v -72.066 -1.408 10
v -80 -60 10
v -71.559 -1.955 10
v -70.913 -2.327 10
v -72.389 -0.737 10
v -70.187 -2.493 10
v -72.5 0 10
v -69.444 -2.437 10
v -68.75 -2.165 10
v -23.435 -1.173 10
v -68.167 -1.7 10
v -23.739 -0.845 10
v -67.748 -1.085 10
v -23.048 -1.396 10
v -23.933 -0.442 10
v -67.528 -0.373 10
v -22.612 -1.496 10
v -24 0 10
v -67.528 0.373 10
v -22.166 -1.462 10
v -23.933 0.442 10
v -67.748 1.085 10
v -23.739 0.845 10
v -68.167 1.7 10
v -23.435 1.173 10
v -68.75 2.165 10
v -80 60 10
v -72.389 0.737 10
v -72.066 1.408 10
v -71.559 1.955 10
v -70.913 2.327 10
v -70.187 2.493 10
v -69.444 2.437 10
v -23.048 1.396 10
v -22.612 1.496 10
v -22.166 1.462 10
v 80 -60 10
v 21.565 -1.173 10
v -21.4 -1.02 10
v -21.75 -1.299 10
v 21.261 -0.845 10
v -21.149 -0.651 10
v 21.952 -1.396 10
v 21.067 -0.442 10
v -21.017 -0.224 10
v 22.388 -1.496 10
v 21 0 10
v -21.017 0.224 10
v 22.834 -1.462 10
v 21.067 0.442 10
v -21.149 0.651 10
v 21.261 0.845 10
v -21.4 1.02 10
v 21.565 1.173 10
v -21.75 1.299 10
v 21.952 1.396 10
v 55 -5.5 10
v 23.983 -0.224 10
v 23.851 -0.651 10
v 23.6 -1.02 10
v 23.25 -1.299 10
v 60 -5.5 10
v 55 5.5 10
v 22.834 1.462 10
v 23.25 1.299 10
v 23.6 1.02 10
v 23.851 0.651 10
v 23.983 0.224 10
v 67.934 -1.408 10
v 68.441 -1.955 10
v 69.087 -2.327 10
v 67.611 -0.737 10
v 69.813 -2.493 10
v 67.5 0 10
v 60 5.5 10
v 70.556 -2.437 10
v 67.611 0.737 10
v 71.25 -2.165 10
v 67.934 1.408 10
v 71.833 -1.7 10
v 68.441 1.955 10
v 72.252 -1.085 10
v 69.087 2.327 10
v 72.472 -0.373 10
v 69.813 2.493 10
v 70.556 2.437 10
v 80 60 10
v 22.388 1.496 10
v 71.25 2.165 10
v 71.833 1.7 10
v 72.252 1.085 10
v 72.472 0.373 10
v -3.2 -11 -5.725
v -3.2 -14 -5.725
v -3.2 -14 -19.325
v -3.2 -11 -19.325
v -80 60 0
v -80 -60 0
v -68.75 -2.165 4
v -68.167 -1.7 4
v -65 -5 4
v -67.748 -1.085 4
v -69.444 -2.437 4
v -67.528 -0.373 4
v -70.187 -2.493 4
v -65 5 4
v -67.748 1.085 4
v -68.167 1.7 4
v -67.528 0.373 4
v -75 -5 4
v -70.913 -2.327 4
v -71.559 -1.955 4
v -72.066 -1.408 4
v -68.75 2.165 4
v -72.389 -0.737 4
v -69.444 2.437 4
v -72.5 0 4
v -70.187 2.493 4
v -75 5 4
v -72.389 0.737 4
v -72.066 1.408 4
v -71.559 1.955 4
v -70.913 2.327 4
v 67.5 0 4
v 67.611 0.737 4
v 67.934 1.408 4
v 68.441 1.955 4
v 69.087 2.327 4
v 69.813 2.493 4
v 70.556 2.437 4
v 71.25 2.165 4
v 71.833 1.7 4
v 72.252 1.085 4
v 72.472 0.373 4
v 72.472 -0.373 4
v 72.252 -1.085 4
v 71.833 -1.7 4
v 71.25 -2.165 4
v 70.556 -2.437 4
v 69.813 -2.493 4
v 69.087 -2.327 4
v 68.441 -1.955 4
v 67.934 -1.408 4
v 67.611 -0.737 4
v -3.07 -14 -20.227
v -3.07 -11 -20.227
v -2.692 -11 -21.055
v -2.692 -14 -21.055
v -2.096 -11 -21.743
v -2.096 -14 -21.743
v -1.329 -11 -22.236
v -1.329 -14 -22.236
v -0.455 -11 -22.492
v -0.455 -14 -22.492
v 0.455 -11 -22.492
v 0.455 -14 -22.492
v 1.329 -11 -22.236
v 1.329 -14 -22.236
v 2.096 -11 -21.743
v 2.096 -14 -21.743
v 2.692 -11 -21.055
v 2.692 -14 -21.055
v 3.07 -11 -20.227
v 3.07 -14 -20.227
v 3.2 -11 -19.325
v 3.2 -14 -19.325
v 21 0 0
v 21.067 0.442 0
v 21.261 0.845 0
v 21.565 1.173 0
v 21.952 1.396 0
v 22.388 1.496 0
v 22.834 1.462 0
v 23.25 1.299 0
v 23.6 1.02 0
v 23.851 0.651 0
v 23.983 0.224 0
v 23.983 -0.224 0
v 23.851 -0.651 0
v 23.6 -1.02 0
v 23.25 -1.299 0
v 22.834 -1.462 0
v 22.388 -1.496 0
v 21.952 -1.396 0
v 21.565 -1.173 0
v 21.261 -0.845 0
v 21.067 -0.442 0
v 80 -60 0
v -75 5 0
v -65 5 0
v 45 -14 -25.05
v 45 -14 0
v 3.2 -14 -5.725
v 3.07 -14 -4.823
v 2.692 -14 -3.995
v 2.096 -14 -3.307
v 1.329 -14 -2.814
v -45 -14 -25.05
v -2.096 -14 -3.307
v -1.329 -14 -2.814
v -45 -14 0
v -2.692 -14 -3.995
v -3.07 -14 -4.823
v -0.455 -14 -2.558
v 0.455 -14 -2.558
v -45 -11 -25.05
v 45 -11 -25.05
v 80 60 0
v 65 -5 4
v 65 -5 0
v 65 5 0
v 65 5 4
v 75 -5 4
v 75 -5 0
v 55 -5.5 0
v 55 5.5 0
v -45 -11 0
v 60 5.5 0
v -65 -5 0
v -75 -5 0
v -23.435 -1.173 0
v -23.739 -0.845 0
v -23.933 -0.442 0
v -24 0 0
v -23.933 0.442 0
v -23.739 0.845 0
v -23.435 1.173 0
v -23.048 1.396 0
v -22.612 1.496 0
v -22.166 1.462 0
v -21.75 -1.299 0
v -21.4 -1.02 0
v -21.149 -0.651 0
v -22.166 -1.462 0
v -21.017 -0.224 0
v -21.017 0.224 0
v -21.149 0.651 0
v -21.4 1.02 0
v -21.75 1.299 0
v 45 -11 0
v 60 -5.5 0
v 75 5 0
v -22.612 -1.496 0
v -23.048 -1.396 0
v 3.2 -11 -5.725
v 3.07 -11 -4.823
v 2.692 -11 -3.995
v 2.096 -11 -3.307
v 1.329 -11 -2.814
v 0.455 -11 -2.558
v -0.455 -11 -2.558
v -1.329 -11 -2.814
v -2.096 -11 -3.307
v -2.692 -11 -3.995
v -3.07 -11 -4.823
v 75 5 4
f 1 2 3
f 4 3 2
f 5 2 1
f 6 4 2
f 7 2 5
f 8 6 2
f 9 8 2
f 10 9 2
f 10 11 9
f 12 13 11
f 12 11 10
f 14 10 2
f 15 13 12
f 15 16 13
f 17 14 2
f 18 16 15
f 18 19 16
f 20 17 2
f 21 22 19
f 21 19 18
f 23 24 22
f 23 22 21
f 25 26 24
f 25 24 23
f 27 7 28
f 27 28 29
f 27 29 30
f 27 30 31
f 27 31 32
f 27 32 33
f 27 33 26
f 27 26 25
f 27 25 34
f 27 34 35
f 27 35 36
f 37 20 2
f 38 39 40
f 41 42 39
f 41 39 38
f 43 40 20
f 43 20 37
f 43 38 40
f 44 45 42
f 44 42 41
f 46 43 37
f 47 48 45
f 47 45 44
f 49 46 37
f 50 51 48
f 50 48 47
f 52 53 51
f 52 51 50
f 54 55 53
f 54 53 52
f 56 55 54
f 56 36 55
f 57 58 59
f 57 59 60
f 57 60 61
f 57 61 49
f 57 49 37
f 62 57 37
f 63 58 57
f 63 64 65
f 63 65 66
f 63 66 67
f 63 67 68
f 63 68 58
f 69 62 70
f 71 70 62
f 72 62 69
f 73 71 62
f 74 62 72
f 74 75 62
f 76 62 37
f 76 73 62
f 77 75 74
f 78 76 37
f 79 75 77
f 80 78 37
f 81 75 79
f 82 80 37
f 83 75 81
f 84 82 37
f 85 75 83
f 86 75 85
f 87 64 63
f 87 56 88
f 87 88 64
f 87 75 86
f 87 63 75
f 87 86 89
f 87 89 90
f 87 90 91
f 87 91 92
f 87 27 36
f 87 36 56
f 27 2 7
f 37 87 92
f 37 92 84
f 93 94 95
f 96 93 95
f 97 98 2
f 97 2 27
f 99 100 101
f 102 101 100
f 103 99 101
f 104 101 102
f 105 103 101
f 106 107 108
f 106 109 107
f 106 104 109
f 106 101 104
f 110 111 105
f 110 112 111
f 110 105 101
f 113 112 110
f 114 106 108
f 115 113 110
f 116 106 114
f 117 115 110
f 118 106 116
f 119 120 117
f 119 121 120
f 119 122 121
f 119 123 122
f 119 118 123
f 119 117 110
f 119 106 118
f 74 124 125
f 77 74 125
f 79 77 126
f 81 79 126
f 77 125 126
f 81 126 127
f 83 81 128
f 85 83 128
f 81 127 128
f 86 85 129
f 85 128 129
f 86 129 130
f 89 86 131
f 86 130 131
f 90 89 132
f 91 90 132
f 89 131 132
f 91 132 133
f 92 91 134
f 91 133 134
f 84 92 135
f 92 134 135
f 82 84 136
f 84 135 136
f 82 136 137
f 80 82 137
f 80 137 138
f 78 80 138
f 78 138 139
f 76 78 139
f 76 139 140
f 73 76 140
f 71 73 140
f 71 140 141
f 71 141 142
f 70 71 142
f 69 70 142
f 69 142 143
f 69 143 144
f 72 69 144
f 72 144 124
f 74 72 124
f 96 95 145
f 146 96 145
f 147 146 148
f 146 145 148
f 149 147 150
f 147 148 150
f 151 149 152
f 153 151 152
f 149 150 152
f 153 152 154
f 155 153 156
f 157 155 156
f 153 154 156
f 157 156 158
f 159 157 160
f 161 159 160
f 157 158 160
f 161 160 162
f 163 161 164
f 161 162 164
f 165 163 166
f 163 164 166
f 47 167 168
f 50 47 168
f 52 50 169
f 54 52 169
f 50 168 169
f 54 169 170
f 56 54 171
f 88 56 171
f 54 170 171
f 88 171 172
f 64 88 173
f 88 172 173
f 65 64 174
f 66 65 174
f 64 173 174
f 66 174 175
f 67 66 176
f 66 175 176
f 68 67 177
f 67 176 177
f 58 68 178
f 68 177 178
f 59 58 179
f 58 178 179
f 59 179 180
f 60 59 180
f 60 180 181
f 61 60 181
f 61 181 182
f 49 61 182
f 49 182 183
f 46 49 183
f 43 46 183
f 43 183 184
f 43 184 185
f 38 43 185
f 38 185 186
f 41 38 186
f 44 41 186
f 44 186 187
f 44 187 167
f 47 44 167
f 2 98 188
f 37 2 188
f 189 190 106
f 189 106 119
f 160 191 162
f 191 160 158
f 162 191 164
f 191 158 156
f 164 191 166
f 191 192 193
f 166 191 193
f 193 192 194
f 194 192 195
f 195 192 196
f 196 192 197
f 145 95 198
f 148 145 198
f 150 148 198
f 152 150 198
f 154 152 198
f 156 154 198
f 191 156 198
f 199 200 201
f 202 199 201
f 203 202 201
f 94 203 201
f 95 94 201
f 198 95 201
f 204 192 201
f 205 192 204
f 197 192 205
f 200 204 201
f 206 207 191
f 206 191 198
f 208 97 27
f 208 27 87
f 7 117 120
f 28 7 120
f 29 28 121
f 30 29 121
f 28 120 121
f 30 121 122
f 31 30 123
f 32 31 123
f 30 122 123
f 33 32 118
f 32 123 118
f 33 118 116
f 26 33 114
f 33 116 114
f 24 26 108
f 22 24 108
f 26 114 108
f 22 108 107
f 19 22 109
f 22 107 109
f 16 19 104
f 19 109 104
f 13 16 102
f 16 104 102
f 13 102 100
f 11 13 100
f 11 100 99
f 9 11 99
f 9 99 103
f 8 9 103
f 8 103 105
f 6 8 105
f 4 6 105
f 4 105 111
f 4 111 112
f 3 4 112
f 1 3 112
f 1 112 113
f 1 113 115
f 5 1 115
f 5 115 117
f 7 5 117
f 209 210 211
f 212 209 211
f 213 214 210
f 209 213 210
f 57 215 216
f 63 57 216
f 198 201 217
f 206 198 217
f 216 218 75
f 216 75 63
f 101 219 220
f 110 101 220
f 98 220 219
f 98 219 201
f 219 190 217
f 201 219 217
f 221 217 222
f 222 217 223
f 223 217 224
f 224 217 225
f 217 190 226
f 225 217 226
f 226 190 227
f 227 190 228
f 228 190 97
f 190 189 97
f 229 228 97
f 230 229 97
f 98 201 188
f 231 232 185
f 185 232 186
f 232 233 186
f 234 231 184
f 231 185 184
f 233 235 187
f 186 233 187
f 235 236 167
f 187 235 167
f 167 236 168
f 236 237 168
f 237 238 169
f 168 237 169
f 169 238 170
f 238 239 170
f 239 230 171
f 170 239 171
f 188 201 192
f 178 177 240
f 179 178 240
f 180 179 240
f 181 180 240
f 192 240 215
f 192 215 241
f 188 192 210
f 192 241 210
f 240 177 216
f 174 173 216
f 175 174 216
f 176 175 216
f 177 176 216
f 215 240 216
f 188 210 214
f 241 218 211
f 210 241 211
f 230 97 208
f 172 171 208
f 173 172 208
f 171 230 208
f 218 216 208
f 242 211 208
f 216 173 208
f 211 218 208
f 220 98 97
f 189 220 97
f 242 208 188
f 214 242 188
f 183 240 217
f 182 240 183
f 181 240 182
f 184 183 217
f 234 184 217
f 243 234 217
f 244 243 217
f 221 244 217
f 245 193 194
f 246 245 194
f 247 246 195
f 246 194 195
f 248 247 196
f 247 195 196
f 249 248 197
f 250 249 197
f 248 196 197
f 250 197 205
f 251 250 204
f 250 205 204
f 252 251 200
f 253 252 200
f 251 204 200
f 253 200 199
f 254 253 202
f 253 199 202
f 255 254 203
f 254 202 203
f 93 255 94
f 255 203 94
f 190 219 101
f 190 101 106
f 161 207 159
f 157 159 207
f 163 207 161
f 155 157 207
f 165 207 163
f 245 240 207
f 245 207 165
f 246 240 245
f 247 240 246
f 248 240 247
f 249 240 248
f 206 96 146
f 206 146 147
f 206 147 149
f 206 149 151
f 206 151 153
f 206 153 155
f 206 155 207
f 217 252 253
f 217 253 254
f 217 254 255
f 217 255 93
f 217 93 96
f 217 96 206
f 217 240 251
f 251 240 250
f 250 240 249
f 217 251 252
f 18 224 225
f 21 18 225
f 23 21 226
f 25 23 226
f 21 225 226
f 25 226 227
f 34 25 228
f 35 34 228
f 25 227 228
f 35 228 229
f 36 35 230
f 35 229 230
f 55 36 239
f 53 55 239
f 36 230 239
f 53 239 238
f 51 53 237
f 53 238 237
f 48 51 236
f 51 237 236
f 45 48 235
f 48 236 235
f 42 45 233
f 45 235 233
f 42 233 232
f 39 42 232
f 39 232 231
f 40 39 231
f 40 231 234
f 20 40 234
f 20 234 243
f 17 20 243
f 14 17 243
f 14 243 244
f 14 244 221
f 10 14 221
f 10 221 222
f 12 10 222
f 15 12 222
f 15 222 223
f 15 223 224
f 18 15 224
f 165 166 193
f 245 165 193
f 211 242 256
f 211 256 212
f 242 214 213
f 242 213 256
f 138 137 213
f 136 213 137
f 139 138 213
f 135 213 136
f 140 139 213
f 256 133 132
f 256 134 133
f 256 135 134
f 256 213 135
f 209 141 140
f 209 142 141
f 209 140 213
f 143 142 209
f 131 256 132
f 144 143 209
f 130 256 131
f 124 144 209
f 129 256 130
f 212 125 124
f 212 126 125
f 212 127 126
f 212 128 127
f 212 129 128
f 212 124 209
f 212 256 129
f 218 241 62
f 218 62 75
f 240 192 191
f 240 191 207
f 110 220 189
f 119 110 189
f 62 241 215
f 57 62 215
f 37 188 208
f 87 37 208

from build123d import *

# Parameters (mm, degrees)
SKETCH1_W           = 160
SKETCH1_H           = 120
BOSS_EXTRUDE1_DEPTH = 10
SKETCH2_R           = 1.5
SKETCH2_R_2         = 2.5
SKETCH2_W           = 5
SKETCH2_H           = 11
CUT_EXTRUDE2_DEPTH  = 101.498756211
SKETCH3_W           = 10
SKETCH3_H           = 10
CUT_EXTRUDE3_DEPTH  = 4
SKETCH4_W           = 90
SKETCH4_H           = 3
BOSS_EXTRUDE3_DEPTH = 25.05
CUT_EXTRUDE5_DEPTH  = 112.819061434


with BuildPart() as part:
    # Sketch1 → Boss-Extrude1 (new body)
    with BuildSketch(Plane.XY):
        Rectangle(SKETCH1_W, SKETCH1_H)
    extrude(amount=BOSS_EXTRUDE1_DEPTH)

    # Sketch2 → Cut-Extrude2 (cut, through all)
    with BuildSketch(Plane(origin=(0, 0, 0), x_dir=(-1, 0, 0), z_dir=(0, 0, -1))):
        with Locations((-22.5, 0)):
            Circle(SKETCH2_R)
        with Locations((22.5, 0)):
            Circle(SKETCH2_R)
        with Locations((70, 0)):
            Circle(SKETCH2_R_2)
        with Locations((-70, 0)):
            Circle(SKETCH2_R_2)
        with Locations((-57.5, 0)):
            Rectangle(SKETCH2_W, SKETCH2_H)
    extrude(amount=-CUT_EXTRUDE2_DEPTH, mode=Mode.SUBTRACT)

    # Sketch3 → Cut-Extrude3 (cut)
    with BuildSketch(Plane(origin=(0, 0, 0), x_dir=(-1, 0, 0), z_dir=(0, 0, -1))):
        with Locations((-70, 0)):
            Rectangle(SKETCH3_W, SKETCH3_H)
        with Locations((70, 0)):
            Rectangle(SKETCH3_W, SKETCH3_H)
    extrude(amount=-CUT_EXTRUDE3_DEPTH, mode=Mode.SUBTRACT)

    # Sketch4 → Boss-Extrude3 (add)
    with BuildSketch(Plane(origin=(0, 0, 0), x_dir=(-1, 0, 0), z_dir=(0, 0, -1))):
        with Locations((0, -12.5)):
            Rectangle(SKETCH4_W, SKETCH4_H)
    extrude(amount=BOSS_EXTRUDE3_DEPTH)

    # Sketch5 → Cut-Extrude5 (cut, through all)
    with BuildSketch(Plane.XZ.offset(14)):
        with BuildLine():
            Line((3.2, -19.325), (3.2, -5.725))
            ThreePointArc((3.2, -5.725), (0, -2.525), (-3.2, -5.725))
            Line((-3.2, -5.725), (-3.2, -19.325))
            ThreePointArc((-3.2, -19.325), (0, -22.525), (3.2, -19.325))
        make_face()
    extrude(amount=-CUT_EXTRUDE5_DEPTH, mode=Mode.SUBTRACT)


solid = part.part
